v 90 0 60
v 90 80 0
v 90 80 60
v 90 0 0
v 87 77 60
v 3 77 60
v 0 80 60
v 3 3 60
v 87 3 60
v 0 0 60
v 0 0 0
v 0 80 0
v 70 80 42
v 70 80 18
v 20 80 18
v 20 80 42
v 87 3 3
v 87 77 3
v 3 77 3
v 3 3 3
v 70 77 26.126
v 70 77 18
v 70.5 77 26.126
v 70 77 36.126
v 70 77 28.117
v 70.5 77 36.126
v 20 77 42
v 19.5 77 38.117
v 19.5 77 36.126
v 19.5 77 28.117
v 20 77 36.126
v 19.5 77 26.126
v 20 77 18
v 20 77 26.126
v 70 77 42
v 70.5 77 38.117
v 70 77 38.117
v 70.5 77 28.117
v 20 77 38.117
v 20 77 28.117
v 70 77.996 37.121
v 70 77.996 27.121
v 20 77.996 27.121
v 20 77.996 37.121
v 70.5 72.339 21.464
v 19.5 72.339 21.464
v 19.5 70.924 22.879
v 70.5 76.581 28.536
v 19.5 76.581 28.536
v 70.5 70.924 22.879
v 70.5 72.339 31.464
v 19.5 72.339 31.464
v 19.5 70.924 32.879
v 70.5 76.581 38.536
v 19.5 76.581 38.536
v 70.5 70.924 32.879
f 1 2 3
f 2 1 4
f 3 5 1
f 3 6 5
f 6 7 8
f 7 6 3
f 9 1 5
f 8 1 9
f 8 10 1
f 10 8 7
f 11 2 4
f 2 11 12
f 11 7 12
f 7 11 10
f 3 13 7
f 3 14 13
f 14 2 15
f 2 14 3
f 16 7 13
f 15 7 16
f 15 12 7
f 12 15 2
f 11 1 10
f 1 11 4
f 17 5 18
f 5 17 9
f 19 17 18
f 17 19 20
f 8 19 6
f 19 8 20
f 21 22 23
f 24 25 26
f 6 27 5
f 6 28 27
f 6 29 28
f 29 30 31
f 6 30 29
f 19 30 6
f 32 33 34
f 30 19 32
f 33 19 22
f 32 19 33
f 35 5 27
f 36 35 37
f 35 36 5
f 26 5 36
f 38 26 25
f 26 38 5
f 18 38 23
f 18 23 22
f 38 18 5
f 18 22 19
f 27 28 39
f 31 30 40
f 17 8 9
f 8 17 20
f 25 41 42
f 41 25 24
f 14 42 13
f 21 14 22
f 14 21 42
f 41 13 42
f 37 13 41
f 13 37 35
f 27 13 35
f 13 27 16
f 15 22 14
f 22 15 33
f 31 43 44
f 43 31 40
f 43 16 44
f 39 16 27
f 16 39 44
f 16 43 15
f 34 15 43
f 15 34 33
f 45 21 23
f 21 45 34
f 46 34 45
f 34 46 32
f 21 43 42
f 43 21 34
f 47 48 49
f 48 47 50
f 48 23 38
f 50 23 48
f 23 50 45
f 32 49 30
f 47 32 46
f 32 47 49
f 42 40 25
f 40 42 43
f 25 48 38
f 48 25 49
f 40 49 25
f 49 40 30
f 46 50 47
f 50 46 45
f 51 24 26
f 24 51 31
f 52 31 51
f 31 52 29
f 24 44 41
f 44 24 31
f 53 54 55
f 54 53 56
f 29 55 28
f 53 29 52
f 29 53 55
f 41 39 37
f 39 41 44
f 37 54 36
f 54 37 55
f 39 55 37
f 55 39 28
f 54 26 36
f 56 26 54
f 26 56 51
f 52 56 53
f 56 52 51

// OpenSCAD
$fn = 32;

// ----------------------------------------------------------------------
// Vent box: louvers enclosure
// ----------------------------------------------------------------------

// --- parameters (mm) ---
box_l = 90;               // box length, X
box_w = 80;               // box width, Y
box_h = 60;               // box height, Z
wall_t = 3;               // shell wall thickness
win_l = 50;               // vent window width, X
win_h = 24;               // vent window height, Z
slat_t = 2;               // louver slat thickness
slat_d = 8;               // louver slat depth
slat_a = 45;              // louver slat angle, degrees
slat_pitch = 10;          // louver pitch
slat_yc = 74.46;          // slat centreline Y

win_z0 = (box_h - win_h) / 2;  // window lower edge Z
n_slats = 2;  // louver count
slat_z0 = win_z0 + (win_h - (n_slats - 1) * slat_pitch) / 2;

difference() {
  union() {
    difference() {
      cube([box_l, box_w, box_h]);
  translate([wall_t, wall_t, wall_t])
    cube([box_l - 2 * wall_t, box_w - 2 * wall_t, box_h]);
  translate([(box_l - win_l) / 2, box_w - wall_t - 1, win_z0])
    cube([win_l, wall_t + 2, win_h]);
    }
    for (i = [0 : n_slats - 1])
      translate([box_l / 2, slat_yc, slat_z0 + i * slat_pitch])
        rotate([slat_a, 0, 0])
          cube([win_l + 1, slat_d, slat_t], center = true);
  }
}
